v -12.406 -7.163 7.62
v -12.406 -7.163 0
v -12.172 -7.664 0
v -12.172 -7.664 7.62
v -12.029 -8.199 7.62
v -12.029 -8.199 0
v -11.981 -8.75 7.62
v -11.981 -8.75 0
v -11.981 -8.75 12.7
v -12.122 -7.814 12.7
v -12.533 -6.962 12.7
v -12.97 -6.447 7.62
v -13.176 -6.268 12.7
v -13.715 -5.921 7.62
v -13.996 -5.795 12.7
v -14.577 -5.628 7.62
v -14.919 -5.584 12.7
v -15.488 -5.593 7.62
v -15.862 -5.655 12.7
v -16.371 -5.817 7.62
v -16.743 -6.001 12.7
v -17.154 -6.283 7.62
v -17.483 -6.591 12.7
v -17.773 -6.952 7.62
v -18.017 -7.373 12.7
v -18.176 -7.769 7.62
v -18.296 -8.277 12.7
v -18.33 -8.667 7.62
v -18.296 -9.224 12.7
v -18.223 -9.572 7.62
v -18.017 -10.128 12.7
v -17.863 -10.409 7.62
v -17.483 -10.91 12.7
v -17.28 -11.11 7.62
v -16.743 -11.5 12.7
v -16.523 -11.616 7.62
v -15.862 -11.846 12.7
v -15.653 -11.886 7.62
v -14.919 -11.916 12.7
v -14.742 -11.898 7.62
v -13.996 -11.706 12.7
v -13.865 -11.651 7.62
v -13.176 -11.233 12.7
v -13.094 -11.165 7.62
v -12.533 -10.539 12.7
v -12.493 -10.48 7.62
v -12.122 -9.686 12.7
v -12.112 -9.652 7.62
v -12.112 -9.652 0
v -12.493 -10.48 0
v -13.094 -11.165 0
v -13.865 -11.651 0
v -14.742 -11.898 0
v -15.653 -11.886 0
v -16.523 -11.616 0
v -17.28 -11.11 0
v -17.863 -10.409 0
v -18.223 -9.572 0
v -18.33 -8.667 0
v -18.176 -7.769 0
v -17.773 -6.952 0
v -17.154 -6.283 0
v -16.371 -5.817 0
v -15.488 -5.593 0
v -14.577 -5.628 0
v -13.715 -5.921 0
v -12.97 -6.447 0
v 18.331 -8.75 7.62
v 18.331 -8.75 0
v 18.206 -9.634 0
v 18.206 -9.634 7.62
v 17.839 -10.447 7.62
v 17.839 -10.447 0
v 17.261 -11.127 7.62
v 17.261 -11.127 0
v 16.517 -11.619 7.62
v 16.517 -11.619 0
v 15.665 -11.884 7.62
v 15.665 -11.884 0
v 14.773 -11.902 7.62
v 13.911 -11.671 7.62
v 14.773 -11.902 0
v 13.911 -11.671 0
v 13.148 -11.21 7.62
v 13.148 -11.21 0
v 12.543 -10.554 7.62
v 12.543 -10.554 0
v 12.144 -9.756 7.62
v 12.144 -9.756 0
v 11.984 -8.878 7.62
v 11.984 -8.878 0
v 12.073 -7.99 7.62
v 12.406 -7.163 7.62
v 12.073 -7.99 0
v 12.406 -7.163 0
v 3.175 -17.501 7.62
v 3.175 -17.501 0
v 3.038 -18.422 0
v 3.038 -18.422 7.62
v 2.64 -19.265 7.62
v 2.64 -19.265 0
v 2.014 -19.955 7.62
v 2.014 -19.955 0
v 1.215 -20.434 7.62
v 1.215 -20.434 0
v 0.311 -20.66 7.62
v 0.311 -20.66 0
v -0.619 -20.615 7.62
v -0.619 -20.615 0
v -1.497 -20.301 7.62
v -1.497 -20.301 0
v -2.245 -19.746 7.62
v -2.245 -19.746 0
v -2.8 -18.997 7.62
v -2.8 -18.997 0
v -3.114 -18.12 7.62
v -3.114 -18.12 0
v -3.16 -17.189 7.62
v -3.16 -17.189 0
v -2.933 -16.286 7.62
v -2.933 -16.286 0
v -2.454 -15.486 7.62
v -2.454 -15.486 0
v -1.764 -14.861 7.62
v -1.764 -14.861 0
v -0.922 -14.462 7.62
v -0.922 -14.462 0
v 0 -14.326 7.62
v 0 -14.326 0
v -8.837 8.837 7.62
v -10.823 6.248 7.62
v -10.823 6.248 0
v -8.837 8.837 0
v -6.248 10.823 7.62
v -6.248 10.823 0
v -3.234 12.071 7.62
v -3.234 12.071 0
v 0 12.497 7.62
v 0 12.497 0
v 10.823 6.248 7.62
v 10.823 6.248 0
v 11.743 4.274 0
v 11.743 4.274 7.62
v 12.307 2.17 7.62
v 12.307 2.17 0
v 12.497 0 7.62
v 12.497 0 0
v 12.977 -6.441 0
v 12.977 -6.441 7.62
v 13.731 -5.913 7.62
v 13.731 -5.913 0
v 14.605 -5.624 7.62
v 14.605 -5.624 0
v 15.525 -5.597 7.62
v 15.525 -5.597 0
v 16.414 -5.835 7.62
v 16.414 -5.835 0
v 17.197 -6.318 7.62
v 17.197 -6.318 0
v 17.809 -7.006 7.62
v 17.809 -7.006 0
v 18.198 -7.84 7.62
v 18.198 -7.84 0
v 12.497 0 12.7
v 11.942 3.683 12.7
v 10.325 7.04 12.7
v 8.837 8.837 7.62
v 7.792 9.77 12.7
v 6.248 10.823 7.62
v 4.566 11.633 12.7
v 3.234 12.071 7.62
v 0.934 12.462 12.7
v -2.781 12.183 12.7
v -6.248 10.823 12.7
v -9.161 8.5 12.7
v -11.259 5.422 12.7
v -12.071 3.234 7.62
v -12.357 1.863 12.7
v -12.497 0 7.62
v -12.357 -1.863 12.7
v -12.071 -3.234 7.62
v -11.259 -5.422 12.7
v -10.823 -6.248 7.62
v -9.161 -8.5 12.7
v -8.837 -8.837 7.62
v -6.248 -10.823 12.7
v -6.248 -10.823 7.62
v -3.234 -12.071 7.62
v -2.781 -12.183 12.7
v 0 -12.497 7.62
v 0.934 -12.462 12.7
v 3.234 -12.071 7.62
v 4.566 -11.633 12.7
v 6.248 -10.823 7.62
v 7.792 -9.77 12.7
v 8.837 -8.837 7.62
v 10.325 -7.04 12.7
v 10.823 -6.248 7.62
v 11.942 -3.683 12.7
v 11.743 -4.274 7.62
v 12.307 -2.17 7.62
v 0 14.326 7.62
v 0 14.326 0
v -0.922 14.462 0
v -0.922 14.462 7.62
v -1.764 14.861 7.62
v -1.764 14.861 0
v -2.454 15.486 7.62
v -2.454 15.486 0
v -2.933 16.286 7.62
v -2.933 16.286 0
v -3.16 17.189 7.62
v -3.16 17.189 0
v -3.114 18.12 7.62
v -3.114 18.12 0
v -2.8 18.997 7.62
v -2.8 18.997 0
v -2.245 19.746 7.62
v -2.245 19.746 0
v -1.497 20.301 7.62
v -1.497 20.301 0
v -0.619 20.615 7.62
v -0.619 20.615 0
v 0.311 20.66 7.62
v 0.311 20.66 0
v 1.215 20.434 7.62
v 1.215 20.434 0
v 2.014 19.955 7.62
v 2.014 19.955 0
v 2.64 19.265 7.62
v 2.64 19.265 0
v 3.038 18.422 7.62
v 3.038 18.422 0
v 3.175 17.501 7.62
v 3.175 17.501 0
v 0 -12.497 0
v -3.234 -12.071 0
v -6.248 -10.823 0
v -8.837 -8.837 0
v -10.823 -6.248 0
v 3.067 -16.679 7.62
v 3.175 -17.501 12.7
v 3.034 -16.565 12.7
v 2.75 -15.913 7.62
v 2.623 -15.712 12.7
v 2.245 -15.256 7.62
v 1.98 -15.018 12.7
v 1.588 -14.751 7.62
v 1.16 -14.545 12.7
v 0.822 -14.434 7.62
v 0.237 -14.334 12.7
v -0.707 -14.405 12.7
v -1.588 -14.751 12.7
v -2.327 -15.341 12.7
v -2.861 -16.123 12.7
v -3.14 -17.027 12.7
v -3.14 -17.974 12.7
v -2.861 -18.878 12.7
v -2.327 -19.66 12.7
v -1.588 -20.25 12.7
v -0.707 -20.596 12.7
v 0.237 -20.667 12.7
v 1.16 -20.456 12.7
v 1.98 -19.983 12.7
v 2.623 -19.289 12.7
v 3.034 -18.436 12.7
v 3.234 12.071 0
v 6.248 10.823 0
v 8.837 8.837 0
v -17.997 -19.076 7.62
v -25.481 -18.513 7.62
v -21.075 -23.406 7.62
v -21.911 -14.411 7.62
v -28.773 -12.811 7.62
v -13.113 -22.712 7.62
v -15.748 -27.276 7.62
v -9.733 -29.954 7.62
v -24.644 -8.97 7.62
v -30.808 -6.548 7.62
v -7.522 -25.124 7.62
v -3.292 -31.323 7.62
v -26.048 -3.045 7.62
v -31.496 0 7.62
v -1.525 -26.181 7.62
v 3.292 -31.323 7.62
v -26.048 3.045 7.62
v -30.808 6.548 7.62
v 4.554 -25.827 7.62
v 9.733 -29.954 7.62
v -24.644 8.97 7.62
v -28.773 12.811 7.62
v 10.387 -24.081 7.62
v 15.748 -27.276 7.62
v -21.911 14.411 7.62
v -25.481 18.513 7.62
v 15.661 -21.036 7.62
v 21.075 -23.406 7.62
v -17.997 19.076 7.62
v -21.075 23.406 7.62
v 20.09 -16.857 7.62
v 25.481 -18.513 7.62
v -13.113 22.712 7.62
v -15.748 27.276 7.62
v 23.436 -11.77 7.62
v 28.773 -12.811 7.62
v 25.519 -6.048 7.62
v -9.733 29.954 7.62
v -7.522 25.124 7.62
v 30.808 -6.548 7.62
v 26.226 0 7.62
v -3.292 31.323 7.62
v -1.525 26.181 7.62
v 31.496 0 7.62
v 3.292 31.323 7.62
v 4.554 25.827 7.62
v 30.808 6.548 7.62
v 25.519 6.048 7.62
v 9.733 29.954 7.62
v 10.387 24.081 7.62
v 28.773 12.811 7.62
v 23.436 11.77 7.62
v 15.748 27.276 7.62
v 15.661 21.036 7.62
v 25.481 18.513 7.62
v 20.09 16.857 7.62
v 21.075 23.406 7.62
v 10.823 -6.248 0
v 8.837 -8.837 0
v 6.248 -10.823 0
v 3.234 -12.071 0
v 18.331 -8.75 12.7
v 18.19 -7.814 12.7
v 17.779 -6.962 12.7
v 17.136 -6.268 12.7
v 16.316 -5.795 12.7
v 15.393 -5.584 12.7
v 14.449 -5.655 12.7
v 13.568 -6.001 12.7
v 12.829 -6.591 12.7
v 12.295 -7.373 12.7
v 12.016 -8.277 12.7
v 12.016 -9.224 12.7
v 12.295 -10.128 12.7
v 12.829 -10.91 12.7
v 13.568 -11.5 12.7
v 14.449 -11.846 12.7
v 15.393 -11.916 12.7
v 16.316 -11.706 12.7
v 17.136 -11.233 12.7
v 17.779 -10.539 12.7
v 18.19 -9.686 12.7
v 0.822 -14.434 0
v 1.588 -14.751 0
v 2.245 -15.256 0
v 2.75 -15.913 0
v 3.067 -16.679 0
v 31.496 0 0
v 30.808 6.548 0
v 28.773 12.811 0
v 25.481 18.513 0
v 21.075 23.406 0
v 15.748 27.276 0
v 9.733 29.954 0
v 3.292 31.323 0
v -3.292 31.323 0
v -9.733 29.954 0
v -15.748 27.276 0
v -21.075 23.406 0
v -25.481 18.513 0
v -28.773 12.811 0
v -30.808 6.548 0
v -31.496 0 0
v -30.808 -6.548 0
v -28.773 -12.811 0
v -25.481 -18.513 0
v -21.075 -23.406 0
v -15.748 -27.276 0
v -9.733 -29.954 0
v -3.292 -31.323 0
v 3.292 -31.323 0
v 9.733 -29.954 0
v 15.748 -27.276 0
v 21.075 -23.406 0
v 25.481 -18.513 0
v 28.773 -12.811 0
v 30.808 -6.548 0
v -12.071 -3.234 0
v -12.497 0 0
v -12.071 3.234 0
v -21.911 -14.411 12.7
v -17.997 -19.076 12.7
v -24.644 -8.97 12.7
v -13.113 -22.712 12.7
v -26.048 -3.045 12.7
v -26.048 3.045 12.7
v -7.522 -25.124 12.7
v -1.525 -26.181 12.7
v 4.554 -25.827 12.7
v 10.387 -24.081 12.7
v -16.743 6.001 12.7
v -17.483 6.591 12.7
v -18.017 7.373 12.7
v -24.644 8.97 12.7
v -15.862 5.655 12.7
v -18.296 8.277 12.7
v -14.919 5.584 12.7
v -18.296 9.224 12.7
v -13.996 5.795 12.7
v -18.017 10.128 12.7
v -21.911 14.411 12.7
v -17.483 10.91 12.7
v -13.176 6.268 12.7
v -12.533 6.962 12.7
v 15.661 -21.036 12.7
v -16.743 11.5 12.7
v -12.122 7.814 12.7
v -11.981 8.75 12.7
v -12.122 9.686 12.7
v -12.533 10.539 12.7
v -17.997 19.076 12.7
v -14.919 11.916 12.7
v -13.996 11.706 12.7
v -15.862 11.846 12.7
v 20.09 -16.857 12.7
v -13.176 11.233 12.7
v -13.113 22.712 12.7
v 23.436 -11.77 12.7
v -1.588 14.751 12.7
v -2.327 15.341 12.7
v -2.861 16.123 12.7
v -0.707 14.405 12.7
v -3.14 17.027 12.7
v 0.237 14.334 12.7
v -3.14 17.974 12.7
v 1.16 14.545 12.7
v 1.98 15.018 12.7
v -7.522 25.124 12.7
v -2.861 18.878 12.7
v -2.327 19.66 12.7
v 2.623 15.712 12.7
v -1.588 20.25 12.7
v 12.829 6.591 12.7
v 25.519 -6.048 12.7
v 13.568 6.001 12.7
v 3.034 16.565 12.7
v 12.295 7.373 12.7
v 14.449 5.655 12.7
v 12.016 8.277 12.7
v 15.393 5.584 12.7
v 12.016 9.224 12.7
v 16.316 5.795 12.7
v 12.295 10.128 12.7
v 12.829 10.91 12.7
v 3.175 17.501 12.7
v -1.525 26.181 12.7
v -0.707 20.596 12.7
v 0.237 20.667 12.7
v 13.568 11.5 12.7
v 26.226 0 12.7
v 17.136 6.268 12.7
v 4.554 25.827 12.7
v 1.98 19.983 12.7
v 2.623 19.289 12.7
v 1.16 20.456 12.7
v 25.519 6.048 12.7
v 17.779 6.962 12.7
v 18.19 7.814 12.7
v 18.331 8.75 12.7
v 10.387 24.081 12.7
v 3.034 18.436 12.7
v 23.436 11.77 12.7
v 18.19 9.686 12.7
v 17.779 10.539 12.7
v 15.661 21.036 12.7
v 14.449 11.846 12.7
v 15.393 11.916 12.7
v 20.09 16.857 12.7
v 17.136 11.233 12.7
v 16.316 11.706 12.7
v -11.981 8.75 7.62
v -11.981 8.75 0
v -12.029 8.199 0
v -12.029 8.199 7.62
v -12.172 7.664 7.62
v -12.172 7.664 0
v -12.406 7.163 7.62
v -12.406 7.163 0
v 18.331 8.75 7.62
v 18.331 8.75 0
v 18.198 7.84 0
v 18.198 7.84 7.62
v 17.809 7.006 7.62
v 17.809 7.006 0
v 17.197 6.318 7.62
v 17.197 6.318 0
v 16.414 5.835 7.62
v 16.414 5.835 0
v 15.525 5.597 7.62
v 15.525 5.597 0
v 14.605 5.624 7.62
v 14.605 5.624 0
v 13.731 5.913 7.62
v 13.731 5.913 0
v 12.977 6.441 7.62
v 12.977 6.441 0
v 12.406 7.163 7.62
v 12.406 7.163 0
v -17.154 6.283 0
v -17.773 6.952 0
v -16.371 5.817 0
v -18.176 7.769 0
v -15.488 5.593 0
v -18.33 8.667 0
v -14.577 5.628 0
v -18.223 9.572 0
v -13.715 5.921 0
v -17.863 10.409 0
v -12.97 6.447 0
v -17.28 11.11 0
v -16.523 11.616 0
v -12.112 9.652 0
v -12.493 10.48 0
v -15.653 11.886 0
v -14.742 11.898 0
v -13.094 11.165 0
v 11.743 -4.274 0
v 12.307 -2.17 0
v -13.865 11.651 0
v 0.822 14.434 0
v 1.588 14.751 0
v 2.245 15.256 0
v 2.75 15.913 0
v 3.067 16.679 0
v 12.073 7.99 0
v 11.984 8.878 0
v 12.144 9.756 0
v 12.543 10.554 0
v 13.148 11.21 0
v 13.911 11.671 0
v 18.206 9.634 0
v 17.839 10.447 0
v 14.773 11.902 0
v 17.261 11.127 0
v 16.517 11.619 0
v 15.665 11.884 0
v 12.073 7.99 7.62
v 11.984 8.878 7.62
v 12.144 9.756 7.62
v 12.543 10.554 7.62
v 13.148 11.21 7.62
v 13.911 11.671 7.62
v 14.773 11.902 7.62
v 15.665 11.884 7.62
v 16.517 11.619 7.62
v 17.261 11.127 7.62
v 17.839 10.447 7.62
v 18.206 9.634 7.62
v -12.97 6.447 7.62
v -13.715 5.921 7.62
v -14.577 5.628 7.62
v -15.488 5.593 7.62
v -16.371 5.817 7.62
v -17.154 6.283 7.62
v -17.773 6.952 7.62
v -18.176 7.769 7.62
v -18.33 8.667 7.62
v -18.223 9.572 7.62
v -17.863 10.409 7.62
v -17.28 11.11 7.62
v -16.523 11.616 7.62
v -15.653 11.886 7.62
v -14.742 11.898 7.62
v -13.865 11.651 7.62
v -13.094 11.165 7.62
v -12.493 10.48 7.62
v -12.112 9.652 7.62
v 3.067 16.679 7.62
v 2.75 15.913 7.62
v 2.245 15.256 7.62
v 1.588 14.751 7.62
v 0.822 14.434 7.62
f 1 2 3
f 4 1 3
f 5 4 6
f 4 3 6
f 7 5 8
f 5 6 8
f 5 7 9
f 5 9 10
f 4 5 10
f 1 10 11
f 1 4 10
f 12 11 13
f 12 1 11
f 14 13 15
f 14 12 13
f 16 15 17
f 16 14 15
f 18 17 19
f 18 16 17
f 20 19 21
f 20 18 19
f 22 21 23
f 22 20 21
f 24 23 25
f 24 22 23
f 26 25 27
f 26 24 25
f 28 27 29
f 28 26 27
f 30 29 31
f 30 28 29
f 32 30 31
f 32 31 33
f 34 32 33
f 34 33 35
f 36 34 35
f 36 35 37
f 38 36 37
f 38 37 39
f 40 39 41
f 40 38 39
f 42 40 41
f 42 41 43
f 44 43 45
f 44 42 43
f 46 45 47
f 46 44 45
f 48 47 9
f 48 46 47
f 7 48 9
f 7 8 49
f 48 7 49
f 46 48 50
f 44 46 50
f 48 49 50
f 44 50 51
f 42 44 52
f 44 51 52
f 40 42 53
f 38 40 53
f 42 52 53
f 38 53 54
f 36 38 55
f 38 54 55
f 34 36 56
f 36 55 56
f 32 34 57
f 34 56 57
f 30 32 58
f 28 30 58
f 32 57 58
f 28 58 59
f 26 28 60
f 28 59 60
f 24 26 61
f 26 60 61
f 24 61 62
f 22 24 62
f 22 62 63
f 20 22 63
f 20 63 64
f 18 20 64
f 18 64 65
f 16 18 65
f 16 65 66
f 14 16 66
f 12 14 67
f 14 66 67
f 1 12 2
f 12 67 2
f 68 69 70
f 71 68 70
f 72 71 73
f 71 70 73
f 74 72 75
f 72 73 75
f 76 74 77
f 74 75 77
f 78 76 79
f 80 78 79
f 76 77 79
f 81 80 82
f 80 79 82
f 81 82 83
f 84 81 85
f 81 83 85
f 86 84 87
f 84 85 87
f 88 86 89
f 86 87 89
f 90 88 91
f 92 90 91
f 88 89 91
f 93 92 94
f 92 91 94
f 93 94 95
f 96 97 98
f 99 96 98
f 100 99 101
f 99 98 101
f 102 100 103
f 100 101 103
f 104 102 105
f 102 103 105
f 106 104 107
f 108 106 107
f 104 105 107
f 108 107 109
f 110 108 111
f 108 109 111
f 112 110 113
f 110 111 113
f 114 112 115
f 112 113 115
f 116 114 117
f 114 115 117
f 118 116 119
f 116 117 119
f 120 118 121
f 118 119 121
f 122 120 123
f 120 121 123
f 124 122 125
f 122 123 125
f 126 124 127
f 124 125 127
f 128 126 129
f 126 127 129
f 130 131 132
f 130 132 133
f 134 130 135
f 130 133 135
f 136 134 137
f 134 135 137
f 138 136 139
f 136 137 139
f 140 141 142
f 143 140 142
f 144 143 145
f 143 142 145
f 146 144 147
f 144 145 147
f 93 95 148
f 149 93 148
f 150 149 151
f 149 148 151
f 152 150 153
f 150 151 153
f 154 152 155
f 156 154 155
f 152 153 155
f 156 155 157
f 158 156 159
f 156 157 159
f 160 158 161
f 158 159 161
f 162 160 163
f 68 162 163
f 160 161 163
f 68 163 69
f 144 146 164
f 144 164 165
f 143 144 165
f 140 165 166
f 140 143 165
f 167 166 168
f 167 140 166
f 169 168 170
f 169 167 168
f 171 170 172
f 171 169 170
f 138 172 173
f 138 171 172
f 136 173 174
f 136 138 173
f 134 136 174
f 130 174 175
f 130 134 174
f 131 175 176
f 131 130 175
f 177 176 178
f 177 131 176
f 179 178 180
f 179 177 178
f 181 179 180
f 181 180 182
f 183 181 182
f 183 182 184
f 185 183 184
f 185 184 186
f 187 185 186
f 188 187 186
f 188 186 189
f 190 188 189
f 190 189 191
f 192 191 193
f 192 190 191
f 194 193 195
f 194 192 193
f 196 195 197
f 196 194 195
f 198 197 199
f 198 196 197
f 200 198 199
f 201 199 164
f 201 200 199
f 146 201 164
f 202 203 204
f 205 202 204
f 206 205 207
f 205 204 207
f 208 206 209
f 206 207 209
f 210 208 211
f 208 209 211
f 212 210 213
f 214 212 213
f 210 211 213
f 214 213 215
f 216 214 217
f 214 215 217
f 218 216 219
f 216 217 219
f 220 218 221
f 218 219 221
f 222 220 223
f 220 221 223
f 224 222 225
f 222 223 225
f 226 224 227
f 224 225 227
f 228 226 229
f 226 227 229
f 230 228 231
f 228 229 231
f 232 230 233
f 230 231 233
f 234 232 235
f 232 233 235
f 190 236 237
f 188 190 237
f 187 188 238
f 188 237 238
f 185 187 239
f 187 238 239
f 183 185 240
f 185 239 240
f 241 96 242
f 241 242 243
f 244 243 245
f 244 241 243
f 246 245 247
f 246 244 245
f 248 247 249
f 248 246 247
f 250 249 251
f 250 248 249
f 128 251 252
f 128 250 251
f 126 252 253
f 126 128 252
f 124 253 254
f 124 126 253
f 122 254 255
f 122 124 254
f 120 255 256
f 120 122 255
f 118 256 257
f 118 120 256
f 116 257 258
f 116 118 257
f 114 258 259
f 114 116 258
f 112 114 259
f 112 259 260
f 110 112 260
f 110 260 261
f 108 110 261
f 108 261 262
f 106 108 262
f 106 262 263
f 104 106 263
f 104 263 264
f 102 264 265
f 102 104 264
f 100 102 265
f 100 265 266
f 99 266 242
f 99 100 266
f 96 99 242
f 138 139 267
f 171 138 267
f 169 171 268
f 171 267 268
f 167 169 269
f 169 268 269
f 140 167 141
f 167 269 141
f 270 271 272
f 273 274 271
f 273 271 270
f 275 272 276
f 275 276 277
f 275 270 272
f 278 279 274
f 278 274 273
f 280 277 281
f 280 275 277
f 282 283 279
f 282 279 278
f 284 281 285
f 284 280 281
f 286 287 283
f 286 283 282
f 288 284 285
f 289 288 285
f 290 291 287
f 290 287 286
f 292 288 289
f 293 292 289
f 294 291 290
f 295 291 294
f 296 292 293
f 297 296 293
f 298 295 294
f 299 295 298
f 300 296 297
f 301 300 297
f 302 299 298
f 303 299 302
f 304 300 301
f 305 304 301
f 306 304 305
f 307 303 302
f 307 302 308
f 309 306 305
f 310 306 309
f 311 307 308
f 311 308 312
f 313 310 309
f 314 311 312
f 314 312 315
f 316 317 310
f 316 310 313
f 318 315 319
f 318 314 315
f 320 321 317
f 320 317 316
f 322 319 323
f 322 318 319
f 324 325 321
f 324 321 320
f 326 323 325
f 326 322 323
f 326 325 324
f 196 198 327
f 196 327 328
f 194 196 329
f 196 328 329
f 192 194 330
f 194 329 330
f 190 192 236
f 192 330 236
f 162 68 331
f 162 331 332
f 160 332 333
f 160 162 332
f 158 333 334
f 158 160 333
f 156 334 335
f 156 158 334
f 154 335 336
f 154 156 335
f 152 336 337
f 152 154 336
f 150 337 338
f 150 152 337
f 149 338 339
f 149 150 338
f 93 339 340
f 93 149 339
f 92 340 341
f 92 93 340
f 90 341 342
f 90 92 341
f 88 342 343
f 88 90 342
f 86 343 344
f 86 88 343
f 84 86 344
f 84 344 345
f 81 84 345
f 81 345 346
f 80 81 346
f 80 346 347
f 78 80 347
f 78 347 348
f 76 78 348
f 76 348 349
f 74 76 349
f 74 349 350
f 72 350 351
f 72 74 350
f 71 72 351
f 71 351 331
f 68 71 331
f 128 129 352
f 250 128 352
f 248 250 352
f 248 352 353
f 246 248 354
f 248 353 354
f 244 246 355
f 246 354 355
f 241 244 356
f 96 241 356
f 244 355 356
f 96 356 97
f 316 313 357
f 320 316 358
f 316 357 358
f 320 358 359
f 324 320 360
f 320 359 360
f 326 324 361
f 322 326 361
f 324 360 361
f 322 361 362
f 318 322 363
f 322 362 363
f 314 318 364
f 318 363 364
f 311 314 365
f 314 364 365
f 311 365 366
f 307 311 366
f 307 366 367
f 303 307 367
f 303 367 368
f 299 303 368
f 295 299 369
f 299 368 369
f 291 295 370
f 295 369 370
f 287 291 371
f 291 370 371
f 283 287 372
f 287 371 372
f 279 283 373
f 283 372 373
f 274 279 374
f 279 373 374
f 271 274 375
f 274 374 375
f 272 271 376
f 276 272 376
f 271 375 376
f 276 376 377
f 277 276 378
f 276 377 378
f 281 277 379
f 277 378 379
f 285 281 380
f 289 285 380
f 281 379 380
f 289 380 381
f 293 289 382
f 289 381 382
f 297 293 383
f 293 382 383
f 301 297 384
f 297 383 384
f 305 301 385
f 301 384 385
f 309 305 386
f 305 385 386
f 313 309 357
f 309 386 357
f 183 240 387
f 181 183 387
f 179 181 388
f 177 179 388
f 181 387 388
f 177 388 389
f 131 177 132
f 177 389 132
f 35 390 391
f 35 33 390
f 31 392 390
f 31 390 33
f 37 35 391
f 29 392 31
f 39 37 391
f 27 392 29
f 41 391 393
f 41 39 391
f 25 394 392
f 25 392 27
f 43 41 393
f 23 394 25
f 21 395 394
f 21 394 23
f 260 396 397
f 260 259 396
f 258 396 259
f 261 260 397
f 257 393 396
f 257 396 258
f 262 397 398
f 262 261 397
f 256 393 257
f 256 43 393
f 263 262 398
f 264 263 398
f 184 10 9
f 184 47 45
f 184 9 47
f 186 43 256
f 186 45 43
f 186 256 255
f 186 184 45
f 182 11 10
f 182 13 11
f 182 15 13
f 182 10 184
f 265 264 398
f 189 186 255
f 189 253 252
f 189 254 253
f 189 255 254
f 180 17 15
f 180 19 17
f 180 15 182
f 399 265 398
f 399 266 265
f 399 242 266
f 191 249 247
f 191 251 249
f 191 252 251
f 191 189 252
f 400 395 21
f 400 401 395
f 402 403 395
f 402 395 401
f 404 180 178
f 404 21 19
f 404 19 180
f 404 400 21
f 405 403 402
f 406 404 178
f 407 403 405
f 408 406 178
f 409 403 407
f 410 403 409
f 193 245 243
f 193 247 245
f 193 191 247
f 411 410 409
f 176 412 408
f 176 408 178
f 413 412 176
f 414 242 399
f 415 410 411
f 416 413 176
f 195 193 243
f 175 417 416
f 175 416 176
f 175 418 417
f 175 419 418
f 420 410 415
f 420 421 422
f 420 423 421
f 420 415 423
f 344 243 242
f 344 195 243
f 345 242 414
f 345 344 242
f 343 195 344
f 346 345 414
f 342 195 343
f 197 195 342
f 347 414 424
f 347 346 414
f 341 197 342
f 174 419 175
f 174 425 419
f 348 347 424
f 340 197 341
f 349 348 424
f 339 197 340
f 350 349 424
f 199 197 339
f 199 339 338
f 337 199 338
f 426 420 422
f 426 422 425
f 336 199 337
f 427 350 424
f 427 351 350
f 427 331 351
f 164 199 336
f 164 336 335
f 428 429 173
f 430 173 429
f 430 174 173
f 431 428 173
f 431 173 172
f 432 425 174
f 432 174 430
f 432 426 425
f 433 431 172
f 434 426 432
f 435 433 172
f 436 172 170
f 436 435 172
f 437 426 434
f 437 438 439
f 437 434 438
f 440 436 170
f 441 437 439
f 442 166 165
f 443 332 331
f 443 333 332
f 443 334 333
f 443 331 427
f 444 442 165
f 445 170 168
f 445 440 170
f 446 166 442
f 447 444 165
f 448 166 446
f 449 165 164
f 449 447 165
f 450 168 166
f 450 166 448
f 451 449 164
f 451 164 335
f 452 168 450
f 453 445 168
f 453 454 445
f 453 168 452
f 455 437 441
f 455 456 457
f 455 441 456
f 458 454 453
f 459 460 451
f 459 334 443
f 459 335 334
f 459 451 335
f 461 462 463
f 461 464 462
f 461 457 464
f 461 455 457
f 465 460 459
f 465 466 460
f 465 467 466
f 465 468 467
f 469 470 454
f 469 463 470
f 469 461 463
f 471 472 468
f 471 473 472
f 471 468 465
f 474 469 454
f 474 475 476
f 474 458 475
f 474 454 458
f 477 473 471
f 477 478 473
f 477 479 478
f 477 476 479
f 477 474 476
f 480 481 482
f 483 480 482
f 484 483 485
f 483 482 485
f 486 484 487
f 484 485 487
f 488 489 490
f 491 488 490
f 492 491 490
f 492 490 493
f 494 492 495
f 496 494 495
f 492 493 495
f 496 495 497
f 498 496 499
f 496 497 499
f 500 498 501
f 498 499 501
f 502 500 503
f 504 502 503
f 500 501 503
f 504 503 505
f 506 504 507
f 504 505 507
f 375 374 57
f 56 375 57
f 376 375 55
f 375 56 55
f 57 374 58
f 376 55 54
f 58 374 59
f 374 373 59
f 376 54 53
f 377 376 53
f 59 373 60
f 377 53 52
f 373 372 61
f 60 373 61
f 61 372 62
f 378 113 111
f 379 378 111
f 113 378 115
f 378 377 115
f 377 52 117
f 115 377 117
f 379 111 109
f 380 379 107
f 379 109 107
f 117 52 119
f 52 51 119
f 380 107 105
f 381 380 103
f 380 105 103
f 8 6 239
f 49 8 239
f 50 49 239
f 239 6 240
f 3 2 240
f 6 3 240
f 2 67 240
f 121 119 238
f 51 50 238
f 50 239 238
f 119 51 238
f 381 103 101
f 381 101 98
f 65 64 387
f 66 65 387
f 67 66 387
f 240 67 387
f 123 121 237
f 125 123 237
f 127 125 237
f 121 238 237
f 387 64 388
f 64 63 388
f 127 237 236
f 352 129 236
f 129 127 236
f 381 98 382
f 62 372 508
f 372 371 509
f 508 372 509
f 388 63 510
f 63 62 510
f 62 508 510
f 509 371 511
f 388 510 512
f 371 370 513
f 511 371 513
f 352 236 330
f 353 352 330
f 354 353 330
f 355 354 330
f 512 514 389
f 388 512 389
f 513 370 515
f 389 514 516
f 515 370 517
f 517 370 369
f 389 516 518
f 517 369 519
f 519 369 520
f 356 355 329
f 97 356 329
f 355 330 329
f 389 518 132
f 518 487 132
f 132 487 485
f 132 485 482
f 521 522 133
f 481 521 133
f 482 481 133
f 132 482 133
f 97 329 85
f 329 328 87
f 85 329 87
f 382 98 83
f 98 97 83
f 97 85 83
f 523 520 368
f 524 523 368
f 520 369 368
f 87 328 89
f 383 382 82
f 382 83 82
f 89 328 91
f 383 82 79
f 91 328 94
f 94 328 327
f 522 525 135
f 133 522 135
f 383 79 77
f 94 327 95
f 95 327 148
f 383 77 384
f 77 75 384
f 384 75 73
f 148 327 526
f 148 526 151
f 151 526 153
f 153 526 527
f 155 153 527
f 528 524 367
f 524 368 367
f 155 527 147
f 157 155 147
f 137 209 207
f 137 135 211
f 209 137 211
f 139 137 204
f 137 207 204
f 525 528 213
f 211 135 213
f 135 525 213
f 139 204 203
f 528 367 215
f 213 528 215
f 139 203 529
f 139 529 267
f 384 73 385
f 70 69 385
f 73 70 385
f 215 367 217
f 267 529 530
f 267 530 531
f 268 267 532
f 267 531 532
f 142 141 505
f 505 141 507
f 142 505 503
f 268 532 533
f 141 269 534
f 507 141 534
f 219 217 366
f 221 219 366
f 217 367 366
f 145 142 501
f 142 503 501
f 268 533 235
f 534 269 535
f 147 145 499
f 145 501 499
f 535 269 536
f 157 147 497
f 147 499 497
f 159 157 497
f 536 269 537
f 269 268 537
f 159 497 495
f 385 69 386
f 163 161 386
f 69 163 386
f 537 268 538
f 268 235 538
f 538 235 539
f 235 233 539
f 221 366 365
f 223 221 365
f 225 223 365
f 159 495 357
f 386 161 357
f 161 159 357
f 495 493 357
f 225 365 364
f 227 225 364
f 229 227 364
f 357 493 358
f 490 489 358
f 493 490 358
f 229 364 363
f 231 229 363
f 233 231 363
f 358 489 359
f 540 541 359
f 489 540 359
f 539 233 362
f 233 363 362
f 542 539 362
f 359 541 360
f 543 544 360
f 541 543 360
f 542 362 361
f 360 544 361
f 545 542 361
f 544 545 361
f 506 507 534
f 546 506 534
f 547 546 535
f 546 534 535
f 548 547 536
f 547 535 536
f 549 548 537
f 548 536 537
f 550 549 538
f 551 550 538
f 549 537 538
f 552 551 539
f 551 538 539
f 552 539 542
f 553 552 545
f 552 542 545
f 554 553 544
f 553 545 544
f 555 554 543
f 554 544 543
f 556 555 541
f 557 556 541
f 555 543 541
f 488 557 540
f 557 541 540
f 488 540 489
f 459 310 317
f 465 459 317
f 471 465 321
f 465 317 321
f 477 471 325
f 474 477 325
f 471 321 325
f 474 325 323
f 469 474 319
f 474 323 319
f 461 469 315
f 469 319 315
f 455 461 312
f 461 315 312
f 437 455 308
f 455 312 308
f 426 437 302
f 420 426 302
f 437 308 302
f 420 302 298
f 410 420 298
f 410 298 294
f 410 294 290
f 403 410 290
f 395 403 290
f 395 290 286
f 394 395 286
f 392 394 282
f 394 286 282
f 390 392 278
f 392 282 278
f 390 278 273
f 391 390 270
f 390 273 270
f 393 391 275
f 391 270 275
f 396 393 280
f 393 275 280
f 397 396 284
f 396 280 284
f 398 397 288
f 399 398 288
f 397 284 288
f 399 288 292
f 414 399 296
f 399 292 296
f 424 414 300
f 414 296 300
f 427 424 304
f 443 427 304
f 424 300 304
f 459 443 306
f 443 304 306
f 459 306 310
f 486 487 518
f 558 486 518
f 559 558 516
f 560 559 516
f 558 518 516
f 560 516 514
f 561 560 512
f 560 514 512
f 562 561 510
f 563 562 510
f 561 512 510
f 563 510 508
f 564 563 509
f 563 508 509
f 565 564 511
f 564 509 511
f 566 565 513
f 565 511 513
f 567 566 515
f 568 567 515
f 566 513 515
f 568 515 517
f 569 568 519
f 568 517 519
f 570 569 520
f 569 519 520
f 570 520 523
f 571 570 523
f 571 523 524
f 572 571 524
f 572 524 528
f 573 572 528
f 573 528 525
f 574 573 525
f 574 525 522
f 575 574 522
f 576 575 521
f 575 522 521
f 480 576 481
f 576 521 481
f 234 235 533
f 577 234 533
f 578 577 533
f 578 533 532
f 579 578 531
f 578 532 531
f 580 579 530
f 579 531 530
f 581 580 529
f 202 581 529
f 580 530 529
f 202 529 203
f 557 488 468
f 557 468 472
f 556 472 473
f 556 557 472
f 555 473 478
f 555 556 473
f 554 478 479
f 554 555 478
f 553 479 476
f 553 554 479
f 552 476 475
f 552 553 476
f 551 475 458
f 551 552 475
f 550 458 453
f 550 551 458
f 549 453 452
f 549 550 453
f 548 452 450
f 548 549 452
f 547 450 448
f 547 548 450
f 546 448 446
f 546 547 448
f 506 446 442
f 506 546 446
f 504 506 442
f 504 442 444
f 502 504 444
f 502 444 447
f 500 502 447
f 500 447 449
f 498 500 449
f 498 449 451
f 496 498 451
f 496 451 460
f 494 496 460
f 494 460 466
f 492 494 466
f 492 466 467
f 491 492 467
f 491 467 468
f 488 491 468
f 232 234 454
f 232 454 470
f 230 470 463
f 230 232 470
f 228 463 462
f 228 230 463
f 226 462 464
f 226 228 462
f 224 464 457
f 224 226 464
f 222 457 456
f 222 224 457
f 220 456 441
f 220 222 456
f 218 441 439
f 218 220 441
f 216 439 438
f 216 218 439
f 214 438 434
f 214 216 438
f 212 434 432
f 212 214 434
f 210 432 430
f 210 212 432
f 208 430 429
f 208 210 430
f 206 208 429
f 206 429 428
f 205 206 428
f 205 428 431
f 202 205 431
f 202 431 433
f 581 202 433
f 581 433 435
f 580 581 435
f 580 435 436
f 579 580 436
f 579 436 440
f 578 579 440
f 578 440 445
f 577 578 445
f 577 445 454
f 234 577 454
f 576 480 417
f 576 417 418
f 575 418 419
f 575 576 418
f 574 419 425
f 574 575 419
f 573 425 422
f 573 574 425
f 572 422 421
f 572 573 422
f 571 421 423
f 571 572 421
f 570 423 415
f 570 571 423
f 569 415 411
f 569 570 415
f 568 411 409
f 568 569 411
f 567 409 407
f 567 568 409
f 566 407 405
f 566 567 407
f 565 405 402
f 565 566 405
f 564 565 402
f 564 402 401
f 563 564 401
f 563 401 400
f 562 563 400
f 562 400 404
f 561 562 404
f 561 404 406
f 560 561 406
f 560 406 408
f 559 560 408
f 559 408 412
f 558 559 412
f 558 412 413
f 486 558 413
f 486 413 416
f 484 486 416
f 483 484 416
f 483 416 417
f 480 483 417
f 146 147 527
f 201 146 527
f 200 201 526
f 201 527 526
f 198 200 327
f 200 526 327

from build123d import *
from build123d import SkipClean  # not in build123d's __all__

# Parameters (mm, degrees)
F0_R     = 31.496
F1_DEPTH = 7.62
F2_R     = 26.2255
F2_R_2   = 3.175
F2_R_3   = 12.4968
F3_DEPTH = 5.08


with BuildPart() as f1:
    # F0 (on Top) → F1 (new body)
    with BuildSketch(Plane.XY):
        Circle(F0_R)
        with BuildLine():
            ThreePointArc((-11.9809641815, -8.7503), (-18.2227786799, -9.5720504682), (-12.4063335245, -7.1628))
            ThreePointArc((-12.4063335245, -7.1628), (-12.089149683, -7.9285495318), (-11.9809641815, -8.7503))
        make_face(mode=Mode.SUBTRACT)
        with BuildLine():
            ThreePointArc((3.175, -17.5006), (-2.2450640303, -19.7456640303), (0, -14.3256))
            ThreePointArc((0, -14.3256), (2.2450640303, -15.2555359697), (3.175, -17.5006))
        make_face(mode=Mode.SUBTRACT)
        with BuildLine():
            ThreePointArc((18.3309641815, -8.7503), (14.3342137133, -11.8171144985), (12.4063335245, -7.1628))
            ThreePointArc((12.4063335245, -7.1628), (15.9777146497, -5.6834855015), (18.3309641815, -8.7503))
        make_face(mode=Mode.SUBTRACT)
        with BuildLine():
            ThreePointArc((-11.9809641815, 8.7503), (-12.089149683, 7.9285495318), (-12.4063335245, 7.1628))
            ThreePointArc((-12.4063335245, 7.1628), (-18.2227786799, 9.5720504682), (-11.9809641815, 8.7503))
        make_face(mode=Mode.SUBTRACT)
        with BuildLine():
            ThreePointArc((10.822546266, 6.2484), (12.070981866, 3.2344098428), (12.4968, 0))
            ThreePointArc((12.4968, 0), (12.070981866, -3.2344098428), (10.822546266, -6.2484))
            ThreePointArc((10.822546266, -6.2484), (6.2484, -10.822546266), (0, -12.4968))
            ThreePointArc((0, -12.4968), (-6.2484, -10.822546266), (-10.822546266, -6.2484))
            ThreePointArc((-10.822546266, -6.2484), (-12.4968, 0), (-10.822546266, 6.2484))
            ThreePointArc((-10.822546266, 6.2484), (-6.2484, 10.822546266), (0, 12.4968))
            ThreePointArc((0, 12.4968), (6.2484, 10.822546266), (10.822546266, 6.2484))
        make_face(mode=Mode.SUBTRACT)
        with BuildLine():
            ThreePointArc((18.3309641815, 8.7503), (15.9777146497, 5.6834855015), (12.4063335245, 7.1628))
            ThreePointArc((12.4063335245, 7.1628), (14.3342137133, 11.8171144985), (18.3309641815, 8.7503))
        make_face(mode=Mode.SUBTRACT)
        with BuildLine():
            ThreePointArc((3.175, 17.5006), (2.2450640303, 15.2555359697), (0, 14.3256))
            ThreePointArc((0, 14.3256), (-2.2450640303, 19.7456640303), (3.175, 17.5006))
        make_face(mode=Mode.SUBTRACT)
    extrude(amount=F1_DEPTH)

    # F2 (on face) → F3 (join)
    with BuildSketch(Plane.XY.offset(7.62)):
        Circle(F2_R)
        with Locations((-15.1559641815, -8.7503)):
            Circle(F2_R_2, mode=Mode.SUBTRACT)
        with Locations((0, -17.5006)):
            Circle(F2_R_2, mode=Mode.SUBTRACT)
        with Locations((15.1559641815, -8.7503)):
            Circle(F2_R_2, mode=Mode.SUBTRACT)
        with Locations((-15.1559641815, 8.7503)):
            Circle(F2_R_2, mode=Mode.SUBTRACT)
        Circle(F2_R_3, mode=Mode.SUBTRACT)
        with Locations((15.1559641815, 8.7503)):
            Circle(F2_R_2, mode=Mode.SUBTRACT)
        with Locations((0, 17.5006)):
            Circle(F2_R_2, mode=Mode.SUBTRACT)
    with SkipClean():  # cleaning this boolean's faces spoils the solid; the shape is the same uncleaned
        extrude(amount=F3_DEPTH)


solid = f1.part
